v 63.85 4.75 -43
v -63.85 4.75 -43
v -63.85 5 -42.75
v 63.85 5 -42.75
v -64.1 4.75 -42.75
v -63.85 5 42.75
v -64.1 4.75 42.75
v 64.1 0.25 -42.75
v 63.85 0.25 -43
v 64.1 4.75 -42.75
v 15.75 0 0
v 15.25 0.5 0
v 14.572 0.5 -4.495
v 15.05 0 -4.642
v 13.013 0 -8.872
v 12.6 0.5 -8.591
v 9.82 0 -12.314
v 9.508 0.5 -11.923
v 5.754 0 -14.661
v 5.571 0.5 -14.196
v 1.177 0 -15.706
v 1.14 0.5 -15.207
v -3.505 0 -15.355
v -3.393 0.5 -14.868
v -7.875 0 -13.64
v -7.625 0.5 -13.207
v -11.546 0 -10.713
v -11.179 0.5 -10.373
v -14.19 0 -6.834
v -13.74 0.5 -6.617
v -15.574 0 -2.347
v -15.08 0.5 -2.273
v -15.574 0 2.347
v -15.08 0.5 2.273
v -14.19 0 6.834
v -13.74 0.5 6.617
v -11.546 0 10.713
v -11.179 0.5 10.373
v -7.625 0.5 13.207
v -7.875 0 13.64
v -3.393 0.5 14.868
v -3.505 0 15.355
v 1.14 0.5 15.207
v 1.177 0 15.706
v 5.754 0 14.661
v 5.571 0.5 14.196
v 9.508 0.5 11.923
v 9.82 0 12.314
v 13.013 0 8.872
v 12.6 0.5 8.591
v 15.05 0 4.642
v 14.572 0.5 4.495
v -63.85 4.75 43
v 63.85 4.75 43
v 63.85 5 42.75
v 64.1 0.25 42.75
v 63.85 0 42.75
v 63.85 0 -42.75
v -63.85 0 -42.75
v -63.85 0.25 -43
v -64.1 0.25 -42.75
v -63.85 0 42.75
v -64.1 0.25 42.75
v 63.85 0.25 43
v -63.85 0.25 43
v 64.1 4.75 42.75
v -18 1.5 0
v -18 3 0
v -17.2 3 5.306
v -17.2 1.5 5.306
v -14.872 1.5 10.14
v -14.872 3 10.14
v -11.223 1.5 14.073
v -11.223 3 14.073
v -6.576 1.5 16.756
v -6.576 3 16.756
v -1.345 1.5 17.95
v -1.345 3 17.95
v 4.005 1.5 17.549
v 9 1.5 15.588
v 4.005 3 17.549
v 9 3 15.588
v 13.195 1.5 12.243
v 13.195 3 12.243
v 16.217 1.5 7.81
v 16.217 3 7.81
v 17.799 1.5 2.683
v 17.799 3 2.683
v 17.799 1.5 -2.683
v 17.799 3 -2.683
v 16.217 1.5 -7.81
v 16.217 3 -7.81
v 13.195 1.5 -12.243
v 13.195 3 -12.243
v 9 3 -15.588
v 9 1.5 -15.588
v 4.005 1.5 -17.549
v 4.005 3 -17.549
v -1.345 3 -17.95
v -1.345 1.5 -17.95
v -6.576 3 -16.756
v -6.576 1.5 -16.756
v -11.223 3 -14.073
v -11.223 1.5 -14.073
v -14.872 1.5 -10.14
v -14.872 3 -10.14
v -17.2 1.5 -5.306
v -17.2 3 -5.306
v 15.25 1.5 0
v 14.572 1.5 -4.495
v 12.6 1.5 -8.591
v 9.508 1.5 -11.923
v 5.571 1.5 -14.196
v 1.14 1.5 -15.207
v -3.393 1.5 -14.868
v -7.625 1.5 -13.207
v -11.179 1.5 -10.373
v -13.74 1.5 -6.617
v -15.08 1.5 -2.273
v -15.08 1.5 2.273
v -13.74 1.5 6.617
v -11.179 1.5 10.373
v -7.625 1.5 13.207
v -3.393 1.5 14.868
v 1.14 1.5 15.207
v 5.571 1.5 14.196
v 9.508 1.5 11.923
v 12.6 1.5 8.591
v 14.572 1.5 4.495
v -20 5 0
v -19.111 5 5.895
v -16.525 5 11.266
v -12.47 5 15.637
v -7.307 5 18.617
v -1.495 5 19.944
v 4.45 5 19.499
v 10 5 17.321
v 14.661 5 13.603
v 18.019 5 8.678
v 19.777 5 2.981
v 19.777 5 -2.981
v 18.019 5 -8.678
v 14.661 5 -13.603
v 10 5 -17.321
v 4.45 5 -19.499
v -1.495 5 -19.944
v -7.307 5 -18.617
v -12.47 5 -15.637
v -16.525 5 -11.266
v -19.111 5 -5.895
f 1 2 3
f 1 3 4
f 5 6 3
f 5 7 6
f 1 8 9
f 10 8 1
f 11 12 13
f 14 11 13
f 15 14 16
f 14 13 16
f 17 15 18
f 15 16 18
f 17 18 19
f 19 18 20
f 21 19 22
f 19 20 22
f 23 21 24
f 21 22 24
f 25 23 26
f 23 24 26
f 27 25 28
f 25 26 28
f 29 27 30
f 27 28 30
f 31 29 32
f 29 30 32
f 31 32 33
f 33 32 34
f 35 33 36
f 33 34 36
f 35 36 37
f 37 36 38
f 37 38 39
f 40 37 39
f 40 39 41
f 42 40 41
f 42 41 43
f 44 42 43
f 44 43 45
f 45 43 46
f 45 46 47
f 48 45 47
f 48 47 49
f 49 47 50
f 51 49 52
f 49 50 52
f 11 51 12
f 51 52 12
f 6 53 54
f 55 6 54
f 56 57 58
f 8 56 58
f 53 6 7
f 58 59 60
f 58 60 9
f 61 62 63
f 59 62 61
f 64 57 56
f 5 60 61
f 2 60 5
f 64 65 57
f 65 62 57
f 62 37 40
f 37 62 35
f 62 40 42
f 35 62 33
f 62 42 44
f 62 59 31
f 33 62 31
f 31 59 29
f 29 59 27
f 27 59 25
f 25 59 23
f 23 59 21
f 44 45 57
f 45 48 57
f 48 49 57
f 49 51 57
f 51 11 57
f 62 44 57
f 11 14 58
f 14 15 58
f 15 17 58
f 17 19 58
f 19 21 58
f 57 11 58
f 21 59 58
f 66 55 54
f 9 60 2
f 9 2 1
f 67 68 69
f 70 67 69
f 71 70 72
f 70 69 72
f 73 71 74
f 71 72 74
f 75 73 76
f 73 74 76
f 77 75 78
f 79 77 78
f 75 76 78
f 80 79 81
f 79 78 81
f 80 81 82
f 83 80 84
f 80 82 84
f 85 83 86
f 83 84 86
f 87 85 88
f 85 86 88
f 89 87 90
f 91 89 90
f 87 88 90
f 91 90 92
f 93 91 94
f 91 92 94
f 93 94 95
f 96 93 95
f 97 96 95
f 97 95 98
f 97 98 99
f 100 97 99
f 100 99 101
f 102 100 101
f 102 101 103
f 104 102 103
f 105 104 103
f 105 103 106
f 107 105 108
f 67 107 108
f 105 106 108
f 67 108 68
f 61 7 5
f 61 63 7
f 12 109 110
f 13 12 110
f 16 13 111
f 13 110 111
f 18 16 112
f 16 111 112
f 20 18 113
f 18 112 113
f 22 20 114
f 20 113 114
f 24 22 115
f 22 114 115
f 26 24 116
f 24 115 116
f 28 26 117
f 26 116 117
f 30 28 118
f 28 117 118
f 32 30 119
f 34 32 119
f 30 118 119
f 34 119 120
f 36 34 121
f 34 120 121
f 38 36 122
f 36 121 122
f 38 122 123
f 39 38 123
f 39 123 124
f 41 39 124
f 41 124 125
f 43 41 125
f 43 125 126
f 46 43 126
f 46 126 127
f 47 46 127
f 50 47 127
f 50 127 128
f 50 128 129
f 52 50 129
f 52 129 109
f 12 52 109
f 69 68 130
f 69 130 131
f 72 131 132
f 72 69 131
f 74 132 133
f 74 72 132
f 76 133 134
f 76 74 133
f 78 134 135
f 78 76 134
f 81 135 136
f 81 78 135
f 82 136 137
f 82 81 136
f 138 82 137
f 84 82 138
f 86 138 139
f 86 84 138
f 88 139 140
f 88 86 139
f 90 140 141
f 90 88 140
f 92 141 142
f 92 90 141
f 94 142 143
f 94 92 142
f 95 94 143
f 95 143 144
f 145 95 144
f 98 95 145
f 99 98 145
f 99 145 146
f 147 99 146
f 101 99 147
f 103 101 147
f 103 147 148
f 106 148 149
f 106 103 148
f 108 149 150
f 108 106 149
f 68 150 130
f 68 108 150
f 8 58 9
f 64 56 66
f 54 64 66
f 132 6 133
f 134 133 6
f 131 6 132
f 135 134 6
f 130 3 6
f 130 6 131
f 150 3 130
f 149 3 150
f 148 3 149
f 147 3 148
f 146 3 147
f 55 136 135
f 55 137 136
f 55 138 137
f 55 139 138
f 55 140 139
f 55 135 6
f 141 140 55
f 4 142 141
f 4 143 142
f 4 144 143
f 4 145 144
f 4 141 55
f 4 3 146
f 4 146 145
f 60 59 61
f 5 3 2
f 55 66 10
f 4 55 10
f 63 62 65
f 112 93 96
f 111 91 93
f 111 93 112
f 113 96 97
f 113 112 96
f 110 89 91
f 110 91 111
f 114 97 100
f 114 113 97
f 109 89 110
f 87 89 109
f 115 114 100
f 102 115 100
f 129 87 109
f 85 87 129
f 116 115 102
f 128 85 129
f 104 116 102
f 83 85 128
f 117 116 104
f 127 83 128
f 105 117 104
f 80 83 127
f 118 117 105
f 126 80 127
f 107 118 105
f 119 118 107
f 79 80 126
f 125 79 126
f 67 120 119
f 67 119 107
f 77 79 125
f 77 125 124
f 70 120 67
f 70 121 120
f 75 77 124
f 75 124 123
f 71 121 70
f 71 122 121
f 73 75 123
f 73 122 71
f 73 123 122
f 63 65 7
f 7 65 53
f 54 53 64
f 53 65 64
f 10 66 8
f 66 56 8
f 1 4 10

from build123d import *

# Parameters (mm, degrees)
SKETCH1_W      = 128.2
SKETCH1_H      = 86
EXTRUDE1_DEPTH = 5
SKETCH4_R      = 18
EXTRUDE4_DEPTH = 3.5
SKETCH6_R      = 15.25
EXTRUDE6_DEPTH = 2.5
CHAMFER5_SIZE  = 0.5
CHAMFER6_SIZE  = 2
CHAMFER7_SIZE  = 0.25


with BuildPart() as part:
    # Sketch1 → Extrude1 (new body)
    with BuildSketch(Plane(origin=(0, 0, 0), x_dir=(1, 0, 0), z_dir=(0, 1, 0))):
        Rectangle(SKETCH1_W, SKETCH1_H)
    extrude(amount=EXTRUDE1_DEPTH)

    # Sketch4 → Extrude4 (cut)
    with BuildSketch(Plane(origin=(0, 5, 0), x_dir=(-1, 0, 0), z_dir=(0, 1, 0))):
        Circle(SKETCH4_R)
    extrude(amount=-EXTRUDE4_DEPTH, mode=Mode.SUBTRACT)

    # Sketch6 → Extrude6 (cut, through all)
    with BuildSketch(Plane(origin=(0, 1.5, 0), x_dir=(1, 0, 0), z_dir=(0, 1, 0))):
        Circle(SKETCH6_R)
    extrude(amount=-EXTRUDE6_DEPTH, mode=Mode.SUBTRACT)

    # Chamfer5
    chamfer5_edges = [part.edges().sort_by_distance(p)[0] for p in [
        (-15.25, 0, 0),
    ]]
    chamfer(chamfer5_edges, length=CHAMFER5_SIZE)

    # Chamfer6
    chamfer6_edges = [part.edges().sort_by_distance(p)[0] for p in [
        (18, 5, 0),
    ]]
    chamfer(chamfer6_edges, length=CHAMFER6_SIZE)

    # Chamfer7
    chamfer7_edges = [part.edges().sort_by_distance(p)[0] for p in [
        (-64.1, 5, 0),
        (0, 5, 43),
        (64.1, 5, 0),
        (0, 0, 43),
        (-64.1, 0, 0),
        (0, 0, -43),
        (64.1, 0, 0),
        (0, 5, -43),
        (64.1, 2.5, 43),
        (-64.1, 2.5, 43),
        (-64.1, 2.5, -43),
        (64.1, 2.5, -43),
    ]]
    chamfer(chamfer7_edges, length=CHAMFER7_SIZE)


solid = part.part
